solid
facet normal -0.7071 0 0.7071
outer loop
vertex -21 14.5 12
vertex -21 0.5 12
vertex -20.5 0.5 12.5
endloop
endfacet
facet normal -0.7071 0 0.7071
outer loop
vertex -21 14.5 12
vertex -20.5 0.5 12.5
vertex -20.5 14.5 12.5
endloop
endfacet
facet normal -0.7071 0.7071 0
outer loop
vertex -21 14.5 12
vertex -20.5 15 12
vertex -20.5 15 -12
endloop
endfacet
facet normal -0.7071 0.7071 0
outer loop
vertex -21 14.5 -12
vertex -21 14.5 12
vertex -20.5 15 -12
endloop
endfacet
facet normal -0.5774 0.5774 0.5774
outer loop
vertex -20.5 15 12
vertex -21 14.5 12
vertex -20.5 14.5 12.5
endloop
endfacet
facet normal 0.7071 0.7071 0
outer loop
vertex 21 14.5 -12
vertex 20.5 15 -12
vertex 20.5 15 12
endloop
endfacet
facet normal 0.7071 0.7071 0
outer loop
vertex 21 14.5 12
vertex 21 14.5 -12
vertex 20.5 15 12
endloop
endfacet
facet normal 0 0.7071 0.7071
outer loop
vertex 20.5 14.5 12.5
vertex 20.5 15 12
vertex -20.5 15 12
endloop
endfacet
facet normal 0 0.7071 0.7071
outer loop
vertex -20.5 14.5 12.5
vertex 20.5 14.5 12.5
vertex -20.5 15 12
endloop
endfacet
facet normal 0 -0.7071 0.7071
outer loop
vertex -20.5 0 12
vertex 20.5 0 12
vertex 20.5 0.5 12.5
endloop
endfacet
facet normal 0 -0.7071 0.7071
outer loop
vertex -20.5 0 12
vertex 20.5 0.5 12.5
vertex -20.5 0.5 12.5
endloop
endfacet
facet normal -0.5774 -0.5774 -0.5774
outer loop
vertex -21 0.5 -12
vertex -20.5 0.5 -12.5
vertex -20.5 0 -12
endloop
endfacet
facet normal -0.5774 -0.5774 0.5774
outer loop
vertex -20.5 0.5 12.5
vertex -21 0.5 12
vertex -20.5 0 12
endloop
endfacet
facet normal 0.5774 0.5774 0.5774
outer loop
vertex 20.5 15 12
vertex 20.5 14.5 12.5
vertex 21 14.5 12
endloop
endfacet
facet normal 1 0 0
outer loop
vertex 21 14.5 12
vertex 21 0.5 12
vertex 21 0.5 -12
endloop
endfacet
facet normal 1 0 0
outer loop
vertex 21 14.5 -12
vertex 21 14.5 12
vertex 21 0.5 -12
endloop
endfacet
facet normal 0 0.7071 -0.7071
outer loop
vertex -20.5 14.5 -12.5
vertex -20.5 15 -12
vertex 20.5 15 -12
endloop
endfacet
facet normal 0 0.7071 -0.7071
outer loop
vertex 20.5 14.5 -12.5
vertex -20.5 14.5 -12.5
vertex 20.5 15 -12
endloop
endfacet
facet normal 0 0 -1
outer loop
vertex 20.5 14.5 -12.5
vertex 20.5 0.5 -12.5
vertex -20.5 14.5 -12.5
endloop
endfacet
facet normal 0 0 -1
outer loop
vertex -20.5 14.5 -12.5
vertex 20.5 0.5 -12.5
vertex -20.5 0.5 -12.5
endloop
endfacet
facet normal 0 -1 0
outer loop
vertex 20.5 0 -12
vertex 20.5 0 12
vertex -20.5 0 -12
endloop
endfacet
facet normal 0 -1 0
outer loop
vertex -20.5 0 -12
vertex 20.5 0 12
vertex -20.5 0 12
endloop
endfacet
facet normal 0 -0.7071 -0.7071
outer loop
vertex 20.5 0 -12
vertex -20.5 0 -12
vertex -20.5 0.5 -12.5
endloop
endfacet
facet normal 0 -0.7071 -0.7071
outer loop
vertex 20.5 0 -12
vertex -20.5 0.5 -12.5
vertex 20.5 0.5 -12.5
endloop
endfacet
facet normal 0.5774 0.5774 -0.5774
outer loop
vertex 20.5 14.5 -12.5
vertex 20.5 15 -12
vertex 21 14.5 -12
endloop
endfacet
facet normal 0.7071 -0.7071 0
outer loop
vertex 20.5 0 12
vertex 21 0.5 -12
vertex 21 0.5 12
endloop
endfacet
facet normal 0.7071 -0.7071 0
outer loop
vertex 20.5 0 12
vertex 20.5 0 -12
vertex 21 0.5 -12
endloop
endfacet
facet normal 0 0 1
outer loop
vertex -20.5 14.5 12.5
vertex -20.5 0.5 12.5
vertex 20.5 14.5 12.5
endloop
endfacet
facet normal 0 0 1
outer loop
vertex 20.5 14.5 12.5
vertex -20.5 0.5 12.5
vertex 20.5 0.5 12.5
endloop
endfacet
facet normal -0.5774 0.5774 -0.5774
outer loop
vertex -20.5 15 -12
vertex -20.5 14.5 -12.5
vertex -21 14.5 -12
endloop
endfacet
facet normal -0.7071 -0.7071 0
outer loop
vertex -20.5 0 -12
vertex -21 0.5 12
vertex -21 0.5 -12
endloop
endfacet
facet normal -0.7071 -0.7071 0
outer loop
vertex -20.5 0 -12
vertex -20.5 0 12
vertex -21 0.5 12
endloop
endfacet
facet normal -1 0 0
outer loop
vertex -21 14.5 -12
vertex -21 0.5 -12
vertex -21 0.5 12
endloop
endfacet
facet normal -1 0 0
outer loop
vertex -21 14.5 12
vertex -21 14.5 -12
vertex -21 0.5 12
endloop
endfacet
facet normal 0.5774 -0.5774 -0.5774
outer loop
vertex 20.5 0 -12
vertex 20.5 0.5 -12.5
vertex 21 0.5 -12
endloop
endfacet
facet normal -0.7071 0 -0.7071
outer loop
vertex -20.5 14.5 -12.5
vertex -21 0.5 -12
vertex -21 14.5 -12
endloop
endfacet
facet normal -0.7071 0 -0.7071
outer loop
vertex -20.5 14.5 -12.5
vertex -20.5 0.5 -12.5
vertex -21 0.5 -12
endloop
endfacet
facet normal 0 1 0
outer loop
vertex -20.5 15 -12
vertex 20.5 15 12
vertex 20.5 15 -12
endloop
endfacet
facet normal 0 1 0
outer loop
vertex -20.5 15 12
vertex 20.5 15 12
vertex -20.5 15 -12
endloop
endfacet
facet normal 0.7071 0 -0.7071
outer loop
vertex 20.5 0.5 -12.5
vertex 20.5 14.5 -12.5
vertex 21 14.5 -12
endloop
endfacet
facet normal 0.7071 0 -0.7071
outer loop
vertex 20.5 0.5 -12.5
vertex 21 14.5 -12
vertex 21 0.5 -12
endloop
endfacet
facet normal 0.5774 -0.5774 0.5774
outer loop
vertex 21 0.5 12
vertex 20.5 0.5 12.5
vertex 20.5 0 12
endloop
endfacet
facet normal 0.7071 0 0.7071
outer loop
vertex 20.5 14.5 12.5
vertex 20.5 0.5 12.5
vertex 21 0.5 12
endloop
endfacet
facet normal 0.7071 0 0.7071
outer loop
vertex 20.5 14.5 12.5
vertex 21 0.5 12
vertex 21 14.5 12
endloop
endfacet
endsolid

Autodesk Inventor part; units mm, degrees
ref_plane "YZ Plane" through (0, 0, 0) normal (1, 0, 0) x (0, 1, 0)
ref_plane "XZ Plane" through (0, 0, 0) normal (0, 1, 0) x (-1, 0, 0)
ref_plane "XY Plane" through (0, 0, 0) normal (0, 0, 1) x (1, 0, 0)
sketch "Szkic1" plane through (0, 0, 0) normal (0, 1, 0) x (-1, 0, 0)
  line L0 (-21, -12.5) -> (21, -12.5)
  line L1 (21, -12.5) -> (21, 12.5)
  line L2 (21, 12.5) -> (-21, 12.5)
  line L3 (-21, 12.5) -> (-21, -12.5)
  line L4 (-21, -12.5) -> (21, 12.5) construction
  line L5 (21, -12.5) -> (-21, 12.5) construction
  point P0 (0, 0)
  dimension "d2" = 42
  dimension "d3" = 25
extrude "Wyciągnięcie proste1" add sketch "Szkic1" along normal blind 15
chamfer "Faza1" distance 0.5 angle 45 12 edges at (0, 15, -12.5) (0, 0, -12.5) (-21, 7.5, -12.5) (-21, 15, 0) (-21, 0, 0) (-21, 7.5, 12.5) (0, 15, 12.5) (0, 0, 12.5) (21, 7.5, 12.5) (21, 15, 0) (21, 7.5, -12.5) (21, 0, 0)
properties part number "kloc"
